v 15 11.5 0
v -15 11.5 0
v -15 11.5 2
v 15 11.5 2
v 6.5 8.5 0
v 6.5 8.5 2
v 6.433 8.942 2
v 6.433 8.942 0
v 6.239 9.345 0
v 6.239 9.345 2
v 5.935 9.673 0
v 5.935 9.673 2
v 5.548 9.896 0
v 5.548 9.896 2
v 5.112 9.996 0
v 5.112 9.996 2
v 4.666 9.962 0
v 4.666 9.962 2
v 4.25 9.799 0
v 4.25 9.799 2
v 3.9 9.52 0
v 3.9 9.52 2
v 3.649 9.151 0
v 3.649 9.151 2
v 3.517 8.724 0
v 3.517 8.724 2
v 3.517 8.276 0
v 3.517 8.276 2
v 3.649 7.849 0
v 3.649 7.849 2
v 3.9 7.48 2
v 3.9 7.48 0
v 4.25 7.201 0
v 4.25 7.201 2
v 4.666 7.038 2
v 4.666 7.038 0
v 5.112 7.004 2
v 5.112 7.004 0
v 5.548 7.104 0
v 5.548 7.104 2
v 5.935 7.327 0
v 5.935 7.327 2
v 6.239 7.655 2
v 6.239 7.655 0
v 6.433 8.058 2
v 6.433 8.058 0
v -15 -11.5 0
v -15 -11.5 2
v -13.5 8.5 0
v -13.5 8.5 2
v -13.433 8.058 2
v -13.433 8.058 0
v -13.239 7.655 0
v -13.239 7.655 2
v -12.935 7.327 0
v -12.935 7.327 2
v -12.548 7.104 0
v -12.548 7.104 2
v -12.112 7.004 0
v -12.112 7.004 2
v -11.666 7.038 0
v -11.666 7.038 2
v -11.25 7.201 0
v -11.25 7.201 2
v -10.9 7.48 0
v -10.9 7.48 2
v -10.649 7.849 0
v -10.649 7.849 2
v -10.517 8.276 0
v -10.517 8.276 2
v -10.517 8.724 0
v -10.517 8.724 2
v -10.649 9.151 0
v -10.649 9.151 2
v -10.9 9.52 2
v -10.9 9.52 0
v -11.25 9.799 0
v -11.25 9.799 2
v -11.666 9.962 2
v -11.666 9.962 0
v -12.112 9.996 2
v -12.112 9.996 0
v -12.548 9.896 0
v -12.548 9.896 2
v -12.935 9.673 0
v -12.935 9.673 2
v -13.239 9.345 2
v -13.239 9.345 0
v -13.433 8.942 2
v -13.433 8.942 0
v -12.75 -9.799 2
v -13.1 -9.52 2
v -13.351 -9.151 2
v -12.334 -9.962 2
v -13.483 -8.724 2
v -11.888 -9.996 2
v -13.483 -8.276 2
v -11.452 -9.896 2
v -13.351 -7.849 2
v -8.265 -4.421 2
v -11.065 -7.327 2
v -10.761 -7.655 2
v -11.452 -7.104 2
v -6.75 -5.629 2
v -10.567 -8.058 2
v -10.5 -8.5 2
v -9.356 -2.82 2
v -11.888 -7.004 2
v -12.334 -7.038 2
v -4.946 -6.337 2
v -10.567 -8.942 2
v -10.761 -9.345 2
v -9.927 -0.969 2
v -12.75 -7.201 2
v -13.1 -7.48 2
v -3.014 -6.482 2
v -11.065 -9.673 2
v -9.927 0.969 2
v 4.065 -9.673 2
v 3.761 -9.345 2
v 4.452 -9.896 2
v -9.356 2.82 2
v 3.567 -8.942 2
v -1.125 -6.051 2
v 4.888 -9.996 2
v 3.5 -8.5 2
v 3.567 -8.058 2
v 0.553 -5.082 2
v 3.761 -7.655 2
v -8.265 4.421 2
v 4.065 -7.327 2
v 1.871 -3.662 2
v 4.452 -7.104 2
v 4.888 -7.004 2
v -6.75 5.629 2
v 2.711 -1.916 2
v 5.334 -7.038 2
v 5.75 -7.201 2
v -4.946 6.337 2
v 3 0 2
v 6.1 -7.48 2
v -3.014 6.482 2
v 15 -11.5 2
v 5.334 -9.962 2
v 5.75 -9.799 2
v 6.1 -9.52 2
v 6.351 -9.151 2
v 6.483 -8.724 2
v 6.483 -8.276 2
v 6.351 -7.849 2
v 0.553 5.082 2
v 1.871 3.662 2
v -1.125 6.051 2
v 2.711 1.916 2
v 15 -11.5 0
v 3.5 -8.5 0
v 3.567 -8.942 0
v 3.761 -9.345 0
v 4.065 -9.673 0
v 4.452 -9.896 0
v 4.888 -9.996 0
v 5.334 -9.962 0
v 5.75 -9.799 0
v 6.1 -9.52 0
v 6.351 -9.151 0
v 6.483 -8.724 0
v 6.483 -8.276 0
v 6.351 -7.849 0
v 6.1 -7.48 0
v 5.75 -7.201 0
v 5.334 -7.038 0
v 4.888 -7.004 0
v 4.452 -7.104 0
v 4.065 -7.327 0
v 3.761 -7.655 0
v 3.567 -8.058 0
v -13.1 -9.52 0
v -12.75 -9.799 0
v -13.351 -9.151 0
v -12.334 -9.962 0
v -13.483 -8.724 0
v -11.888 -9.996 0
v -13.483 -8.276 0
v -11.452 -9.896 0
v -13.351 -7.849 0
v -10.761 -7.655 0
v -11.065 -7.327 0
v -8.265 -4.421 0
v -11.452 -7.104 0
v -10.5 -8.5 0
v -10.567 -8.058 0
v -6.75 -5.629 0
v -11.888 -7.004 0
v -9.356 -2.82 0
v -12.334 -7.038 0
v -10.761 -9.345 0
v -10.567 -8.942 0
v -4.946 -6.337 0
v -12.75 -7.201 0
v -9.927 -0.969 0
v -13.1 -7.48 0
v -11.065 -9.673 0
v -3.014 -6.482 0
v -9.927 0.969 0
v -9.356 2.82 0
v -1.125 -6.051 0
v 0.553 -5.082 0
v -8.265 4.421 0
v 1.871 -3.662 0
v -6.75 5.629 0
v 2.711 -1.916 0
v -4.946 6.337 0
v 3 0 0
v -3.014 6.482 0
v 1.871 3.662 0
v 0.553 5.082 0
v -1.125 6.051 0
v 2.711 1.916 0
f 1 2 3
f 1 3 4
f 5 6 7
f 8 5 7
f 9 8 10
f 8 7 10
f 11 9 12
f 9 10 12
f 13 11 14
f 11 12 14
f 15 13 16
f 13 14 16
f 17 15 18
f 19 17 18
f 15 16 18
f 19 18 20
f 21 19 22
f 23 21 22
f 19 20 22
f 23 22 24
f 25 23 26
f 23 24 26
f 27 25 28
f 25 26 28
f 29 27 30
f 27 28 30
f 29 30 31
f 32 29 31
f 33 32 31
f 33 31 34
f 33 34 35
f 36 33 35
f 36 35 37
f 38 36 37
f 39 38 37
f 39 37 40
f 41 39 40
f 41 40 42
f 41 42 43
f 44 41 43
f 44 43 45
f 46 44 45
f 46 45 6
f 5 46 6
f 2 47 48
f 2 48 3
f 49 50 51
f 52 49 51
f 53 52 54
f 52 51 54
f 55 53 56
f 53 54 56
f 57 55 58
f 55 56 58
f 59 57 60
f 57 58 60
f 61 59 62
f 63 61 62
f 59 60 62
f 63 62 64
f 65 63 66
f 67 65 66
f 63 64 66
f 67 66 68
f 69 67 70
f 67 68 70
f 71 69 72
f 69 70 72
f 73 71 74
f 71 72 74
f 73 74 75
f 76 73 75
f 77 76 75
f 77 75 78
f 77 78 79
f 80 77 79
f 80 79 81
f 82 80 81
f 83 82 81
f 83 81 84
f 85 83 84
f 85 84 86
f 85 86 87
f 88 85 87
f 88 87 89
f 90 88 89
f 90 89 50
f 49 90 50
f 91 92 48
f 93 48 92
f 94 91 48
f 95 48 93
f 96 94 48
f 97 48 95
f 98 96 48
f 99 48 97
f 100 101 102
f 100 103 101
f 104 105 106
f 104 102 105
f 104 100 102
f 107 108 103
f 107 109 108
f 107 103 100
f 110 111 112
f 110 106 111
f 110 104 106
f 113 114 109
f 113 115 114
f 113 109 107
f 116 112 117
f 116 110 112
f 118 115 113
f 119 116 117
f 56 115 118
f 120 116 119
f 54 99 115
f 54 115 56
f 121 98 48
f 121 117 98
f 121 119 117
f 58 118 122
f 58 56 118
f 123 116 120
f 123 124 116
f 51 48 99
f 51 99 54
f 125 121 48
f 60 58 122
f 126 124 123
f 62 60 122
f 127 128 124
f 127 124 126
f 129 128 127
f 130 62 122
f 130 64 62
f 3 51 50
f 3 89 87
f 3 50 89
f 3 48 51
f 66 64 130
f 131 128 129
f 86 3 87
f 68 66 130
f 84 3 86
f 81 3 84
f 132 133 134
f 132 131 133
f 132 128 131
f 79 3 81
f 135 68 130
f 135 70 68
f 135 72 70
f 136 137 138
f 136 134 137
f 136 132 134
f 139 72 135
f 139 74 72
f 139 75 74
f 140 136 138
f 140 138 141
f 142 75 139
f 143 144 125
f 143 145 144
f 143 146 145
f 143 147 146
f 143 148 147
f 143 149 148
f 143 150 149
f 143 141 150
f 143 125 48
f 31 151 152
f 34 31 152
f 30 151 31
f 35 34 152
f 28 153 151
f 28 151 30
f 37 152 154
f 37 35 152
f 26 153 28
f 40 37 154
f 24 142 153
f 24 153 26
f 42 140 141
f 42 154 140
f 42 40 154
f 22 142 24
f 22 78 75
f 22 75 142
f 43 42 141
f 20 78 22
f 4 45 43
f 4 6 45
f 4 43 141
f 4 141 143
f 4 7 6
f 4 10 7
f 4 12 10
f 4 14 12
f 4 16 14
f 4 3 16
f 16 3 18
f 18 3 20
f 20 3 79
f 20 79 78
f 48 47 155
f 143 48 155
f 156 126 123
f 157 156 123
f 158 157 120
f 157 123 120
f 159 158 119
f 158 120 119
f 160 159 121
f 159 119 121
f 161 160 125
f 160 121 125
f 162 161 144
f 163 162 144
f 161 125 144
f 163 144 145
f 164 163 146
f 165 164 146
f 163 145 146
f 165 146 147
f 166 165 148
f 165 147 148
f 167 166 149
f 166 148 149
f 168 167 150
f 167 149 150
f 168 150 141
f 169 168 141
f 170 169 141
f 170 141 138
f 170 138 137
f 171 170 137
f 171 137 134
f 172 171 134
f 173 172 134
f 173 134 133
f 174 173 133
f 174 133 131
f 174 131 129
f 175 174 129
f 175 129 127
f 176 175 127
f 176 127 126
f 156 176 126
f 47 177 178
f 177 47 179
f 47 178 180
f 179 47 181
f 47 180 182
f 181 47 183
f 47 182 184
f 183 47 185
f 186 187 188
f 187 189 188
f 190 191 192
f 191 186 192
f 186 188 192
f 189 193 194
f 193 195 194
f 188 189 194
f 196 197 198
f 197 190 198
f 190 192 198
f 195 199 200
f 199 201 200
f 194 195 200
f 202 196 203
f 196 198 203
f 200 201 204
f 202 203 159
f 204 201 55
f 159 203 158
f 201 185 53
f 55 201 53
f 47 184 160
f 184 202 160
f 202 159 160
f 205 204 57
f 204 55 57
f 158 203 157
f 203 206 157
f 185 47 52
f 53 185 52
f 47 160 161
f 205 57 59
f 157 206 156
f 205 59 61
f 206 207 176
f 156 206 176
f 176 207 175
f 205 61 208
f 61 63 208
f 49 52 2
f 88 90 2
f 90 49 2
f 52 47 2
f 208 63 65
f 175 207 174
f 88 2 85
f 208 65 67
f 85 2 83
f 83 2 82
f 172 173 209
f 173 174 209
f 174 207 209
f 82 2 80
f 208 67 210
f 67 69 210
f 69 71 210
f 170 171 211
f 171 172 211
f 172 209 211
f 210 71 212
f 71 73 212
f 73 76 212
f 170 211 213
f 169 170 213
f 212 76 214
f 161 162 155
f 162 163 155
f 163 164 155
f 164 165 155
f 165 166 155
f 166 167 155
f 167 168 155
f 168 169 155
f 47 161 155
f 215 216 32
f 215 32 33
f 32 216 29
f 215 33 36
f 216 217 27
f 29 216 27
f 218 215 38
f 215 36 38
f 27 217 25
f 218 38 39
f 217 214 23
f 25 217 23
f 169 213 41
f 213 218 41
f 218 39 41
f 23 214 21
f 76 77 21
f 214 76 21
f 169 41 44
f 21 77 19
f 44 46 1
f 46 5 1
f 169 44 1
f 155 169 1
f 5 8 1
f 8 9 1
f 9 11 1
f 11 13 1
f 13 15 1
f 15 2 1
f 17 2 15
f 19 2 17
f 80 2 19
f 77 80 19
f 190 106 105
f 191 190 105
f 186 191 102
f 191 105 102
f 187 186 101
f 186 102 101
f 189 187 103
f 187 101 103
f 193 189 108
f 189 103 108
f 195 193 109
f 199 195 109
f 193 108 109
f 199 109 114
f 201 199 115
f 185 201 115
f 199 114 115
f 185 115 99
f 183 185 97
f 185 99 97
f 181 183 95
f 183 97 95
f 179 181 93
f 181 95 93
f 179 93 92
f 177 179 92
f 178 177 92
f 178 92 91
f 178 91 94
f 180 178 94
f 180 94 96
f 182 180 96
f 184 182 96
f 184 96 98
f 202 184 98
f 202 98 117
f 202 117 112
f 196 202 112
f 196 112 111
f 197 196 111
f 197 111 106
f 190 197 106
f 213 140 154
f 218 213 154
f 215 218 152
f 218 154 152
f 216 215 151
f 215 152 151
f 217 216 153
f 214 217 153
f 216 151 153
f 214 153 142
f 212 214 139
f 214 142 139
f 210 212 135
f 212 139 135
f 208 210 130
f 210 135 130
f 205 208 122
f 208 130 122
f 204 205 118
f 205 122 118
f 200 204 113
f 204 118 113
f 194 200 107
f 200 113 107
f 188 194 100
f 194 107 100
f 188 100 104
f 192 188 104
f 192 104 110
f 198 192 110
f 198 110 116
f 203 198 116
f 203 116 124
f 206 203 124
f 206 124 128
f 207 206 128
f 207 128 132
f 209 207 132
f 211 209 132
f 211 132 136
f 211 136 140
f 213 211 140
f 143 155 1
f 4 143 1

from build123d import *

# Parameters (mm, degrees)
ESBO_O1_W                = 30
ESBO_O1_H                = 23
RESSALTO_EXTRUS_O1_DEPTH = 2
ESBO_O2_R                = 6.5
ESBO_O2_R_2              = 1.5
CORTE_EXTRUS_O1_DEPTH    = 20.006577809


with BuildPart() as part:
    # Esboço1 → Ressalto-extrusão1 (new body)
    with BuildSketch(Plane.XY):
        Rectangle(ESBO_O1_W, ESBO_O1_H)
    extrude(amount=RESSALTO_EXTRUS_O1_DEPTH)

    # Esboço2 → Corte-extrusão1 (cut, through all)
    with BuildSketch(Plane.XY.offset(2)):
        with Locations((-3.5, 0)):
            Circle(ESBO_O2_R)
        with Locations((5, 8.5)):
            Circle(ESBO_O2_R_2)
        with Locations(Location((5, -8.5, 0), (0, 0, 180))):
            Circle(ESBO_O2_R_2)
        with Locations((-12, -8.5)):
            Circle(ESBO_O2_R_2)
        with Locations(Location((-12, 8.5, 0), (0, 0, 180))):
            Circle(ESBO_O2_R_2)
    extrude(amount=-CORTE_EXTRUS_O1_DEPTH, mode=Mode.SUBTRACT)


solid = part.part
